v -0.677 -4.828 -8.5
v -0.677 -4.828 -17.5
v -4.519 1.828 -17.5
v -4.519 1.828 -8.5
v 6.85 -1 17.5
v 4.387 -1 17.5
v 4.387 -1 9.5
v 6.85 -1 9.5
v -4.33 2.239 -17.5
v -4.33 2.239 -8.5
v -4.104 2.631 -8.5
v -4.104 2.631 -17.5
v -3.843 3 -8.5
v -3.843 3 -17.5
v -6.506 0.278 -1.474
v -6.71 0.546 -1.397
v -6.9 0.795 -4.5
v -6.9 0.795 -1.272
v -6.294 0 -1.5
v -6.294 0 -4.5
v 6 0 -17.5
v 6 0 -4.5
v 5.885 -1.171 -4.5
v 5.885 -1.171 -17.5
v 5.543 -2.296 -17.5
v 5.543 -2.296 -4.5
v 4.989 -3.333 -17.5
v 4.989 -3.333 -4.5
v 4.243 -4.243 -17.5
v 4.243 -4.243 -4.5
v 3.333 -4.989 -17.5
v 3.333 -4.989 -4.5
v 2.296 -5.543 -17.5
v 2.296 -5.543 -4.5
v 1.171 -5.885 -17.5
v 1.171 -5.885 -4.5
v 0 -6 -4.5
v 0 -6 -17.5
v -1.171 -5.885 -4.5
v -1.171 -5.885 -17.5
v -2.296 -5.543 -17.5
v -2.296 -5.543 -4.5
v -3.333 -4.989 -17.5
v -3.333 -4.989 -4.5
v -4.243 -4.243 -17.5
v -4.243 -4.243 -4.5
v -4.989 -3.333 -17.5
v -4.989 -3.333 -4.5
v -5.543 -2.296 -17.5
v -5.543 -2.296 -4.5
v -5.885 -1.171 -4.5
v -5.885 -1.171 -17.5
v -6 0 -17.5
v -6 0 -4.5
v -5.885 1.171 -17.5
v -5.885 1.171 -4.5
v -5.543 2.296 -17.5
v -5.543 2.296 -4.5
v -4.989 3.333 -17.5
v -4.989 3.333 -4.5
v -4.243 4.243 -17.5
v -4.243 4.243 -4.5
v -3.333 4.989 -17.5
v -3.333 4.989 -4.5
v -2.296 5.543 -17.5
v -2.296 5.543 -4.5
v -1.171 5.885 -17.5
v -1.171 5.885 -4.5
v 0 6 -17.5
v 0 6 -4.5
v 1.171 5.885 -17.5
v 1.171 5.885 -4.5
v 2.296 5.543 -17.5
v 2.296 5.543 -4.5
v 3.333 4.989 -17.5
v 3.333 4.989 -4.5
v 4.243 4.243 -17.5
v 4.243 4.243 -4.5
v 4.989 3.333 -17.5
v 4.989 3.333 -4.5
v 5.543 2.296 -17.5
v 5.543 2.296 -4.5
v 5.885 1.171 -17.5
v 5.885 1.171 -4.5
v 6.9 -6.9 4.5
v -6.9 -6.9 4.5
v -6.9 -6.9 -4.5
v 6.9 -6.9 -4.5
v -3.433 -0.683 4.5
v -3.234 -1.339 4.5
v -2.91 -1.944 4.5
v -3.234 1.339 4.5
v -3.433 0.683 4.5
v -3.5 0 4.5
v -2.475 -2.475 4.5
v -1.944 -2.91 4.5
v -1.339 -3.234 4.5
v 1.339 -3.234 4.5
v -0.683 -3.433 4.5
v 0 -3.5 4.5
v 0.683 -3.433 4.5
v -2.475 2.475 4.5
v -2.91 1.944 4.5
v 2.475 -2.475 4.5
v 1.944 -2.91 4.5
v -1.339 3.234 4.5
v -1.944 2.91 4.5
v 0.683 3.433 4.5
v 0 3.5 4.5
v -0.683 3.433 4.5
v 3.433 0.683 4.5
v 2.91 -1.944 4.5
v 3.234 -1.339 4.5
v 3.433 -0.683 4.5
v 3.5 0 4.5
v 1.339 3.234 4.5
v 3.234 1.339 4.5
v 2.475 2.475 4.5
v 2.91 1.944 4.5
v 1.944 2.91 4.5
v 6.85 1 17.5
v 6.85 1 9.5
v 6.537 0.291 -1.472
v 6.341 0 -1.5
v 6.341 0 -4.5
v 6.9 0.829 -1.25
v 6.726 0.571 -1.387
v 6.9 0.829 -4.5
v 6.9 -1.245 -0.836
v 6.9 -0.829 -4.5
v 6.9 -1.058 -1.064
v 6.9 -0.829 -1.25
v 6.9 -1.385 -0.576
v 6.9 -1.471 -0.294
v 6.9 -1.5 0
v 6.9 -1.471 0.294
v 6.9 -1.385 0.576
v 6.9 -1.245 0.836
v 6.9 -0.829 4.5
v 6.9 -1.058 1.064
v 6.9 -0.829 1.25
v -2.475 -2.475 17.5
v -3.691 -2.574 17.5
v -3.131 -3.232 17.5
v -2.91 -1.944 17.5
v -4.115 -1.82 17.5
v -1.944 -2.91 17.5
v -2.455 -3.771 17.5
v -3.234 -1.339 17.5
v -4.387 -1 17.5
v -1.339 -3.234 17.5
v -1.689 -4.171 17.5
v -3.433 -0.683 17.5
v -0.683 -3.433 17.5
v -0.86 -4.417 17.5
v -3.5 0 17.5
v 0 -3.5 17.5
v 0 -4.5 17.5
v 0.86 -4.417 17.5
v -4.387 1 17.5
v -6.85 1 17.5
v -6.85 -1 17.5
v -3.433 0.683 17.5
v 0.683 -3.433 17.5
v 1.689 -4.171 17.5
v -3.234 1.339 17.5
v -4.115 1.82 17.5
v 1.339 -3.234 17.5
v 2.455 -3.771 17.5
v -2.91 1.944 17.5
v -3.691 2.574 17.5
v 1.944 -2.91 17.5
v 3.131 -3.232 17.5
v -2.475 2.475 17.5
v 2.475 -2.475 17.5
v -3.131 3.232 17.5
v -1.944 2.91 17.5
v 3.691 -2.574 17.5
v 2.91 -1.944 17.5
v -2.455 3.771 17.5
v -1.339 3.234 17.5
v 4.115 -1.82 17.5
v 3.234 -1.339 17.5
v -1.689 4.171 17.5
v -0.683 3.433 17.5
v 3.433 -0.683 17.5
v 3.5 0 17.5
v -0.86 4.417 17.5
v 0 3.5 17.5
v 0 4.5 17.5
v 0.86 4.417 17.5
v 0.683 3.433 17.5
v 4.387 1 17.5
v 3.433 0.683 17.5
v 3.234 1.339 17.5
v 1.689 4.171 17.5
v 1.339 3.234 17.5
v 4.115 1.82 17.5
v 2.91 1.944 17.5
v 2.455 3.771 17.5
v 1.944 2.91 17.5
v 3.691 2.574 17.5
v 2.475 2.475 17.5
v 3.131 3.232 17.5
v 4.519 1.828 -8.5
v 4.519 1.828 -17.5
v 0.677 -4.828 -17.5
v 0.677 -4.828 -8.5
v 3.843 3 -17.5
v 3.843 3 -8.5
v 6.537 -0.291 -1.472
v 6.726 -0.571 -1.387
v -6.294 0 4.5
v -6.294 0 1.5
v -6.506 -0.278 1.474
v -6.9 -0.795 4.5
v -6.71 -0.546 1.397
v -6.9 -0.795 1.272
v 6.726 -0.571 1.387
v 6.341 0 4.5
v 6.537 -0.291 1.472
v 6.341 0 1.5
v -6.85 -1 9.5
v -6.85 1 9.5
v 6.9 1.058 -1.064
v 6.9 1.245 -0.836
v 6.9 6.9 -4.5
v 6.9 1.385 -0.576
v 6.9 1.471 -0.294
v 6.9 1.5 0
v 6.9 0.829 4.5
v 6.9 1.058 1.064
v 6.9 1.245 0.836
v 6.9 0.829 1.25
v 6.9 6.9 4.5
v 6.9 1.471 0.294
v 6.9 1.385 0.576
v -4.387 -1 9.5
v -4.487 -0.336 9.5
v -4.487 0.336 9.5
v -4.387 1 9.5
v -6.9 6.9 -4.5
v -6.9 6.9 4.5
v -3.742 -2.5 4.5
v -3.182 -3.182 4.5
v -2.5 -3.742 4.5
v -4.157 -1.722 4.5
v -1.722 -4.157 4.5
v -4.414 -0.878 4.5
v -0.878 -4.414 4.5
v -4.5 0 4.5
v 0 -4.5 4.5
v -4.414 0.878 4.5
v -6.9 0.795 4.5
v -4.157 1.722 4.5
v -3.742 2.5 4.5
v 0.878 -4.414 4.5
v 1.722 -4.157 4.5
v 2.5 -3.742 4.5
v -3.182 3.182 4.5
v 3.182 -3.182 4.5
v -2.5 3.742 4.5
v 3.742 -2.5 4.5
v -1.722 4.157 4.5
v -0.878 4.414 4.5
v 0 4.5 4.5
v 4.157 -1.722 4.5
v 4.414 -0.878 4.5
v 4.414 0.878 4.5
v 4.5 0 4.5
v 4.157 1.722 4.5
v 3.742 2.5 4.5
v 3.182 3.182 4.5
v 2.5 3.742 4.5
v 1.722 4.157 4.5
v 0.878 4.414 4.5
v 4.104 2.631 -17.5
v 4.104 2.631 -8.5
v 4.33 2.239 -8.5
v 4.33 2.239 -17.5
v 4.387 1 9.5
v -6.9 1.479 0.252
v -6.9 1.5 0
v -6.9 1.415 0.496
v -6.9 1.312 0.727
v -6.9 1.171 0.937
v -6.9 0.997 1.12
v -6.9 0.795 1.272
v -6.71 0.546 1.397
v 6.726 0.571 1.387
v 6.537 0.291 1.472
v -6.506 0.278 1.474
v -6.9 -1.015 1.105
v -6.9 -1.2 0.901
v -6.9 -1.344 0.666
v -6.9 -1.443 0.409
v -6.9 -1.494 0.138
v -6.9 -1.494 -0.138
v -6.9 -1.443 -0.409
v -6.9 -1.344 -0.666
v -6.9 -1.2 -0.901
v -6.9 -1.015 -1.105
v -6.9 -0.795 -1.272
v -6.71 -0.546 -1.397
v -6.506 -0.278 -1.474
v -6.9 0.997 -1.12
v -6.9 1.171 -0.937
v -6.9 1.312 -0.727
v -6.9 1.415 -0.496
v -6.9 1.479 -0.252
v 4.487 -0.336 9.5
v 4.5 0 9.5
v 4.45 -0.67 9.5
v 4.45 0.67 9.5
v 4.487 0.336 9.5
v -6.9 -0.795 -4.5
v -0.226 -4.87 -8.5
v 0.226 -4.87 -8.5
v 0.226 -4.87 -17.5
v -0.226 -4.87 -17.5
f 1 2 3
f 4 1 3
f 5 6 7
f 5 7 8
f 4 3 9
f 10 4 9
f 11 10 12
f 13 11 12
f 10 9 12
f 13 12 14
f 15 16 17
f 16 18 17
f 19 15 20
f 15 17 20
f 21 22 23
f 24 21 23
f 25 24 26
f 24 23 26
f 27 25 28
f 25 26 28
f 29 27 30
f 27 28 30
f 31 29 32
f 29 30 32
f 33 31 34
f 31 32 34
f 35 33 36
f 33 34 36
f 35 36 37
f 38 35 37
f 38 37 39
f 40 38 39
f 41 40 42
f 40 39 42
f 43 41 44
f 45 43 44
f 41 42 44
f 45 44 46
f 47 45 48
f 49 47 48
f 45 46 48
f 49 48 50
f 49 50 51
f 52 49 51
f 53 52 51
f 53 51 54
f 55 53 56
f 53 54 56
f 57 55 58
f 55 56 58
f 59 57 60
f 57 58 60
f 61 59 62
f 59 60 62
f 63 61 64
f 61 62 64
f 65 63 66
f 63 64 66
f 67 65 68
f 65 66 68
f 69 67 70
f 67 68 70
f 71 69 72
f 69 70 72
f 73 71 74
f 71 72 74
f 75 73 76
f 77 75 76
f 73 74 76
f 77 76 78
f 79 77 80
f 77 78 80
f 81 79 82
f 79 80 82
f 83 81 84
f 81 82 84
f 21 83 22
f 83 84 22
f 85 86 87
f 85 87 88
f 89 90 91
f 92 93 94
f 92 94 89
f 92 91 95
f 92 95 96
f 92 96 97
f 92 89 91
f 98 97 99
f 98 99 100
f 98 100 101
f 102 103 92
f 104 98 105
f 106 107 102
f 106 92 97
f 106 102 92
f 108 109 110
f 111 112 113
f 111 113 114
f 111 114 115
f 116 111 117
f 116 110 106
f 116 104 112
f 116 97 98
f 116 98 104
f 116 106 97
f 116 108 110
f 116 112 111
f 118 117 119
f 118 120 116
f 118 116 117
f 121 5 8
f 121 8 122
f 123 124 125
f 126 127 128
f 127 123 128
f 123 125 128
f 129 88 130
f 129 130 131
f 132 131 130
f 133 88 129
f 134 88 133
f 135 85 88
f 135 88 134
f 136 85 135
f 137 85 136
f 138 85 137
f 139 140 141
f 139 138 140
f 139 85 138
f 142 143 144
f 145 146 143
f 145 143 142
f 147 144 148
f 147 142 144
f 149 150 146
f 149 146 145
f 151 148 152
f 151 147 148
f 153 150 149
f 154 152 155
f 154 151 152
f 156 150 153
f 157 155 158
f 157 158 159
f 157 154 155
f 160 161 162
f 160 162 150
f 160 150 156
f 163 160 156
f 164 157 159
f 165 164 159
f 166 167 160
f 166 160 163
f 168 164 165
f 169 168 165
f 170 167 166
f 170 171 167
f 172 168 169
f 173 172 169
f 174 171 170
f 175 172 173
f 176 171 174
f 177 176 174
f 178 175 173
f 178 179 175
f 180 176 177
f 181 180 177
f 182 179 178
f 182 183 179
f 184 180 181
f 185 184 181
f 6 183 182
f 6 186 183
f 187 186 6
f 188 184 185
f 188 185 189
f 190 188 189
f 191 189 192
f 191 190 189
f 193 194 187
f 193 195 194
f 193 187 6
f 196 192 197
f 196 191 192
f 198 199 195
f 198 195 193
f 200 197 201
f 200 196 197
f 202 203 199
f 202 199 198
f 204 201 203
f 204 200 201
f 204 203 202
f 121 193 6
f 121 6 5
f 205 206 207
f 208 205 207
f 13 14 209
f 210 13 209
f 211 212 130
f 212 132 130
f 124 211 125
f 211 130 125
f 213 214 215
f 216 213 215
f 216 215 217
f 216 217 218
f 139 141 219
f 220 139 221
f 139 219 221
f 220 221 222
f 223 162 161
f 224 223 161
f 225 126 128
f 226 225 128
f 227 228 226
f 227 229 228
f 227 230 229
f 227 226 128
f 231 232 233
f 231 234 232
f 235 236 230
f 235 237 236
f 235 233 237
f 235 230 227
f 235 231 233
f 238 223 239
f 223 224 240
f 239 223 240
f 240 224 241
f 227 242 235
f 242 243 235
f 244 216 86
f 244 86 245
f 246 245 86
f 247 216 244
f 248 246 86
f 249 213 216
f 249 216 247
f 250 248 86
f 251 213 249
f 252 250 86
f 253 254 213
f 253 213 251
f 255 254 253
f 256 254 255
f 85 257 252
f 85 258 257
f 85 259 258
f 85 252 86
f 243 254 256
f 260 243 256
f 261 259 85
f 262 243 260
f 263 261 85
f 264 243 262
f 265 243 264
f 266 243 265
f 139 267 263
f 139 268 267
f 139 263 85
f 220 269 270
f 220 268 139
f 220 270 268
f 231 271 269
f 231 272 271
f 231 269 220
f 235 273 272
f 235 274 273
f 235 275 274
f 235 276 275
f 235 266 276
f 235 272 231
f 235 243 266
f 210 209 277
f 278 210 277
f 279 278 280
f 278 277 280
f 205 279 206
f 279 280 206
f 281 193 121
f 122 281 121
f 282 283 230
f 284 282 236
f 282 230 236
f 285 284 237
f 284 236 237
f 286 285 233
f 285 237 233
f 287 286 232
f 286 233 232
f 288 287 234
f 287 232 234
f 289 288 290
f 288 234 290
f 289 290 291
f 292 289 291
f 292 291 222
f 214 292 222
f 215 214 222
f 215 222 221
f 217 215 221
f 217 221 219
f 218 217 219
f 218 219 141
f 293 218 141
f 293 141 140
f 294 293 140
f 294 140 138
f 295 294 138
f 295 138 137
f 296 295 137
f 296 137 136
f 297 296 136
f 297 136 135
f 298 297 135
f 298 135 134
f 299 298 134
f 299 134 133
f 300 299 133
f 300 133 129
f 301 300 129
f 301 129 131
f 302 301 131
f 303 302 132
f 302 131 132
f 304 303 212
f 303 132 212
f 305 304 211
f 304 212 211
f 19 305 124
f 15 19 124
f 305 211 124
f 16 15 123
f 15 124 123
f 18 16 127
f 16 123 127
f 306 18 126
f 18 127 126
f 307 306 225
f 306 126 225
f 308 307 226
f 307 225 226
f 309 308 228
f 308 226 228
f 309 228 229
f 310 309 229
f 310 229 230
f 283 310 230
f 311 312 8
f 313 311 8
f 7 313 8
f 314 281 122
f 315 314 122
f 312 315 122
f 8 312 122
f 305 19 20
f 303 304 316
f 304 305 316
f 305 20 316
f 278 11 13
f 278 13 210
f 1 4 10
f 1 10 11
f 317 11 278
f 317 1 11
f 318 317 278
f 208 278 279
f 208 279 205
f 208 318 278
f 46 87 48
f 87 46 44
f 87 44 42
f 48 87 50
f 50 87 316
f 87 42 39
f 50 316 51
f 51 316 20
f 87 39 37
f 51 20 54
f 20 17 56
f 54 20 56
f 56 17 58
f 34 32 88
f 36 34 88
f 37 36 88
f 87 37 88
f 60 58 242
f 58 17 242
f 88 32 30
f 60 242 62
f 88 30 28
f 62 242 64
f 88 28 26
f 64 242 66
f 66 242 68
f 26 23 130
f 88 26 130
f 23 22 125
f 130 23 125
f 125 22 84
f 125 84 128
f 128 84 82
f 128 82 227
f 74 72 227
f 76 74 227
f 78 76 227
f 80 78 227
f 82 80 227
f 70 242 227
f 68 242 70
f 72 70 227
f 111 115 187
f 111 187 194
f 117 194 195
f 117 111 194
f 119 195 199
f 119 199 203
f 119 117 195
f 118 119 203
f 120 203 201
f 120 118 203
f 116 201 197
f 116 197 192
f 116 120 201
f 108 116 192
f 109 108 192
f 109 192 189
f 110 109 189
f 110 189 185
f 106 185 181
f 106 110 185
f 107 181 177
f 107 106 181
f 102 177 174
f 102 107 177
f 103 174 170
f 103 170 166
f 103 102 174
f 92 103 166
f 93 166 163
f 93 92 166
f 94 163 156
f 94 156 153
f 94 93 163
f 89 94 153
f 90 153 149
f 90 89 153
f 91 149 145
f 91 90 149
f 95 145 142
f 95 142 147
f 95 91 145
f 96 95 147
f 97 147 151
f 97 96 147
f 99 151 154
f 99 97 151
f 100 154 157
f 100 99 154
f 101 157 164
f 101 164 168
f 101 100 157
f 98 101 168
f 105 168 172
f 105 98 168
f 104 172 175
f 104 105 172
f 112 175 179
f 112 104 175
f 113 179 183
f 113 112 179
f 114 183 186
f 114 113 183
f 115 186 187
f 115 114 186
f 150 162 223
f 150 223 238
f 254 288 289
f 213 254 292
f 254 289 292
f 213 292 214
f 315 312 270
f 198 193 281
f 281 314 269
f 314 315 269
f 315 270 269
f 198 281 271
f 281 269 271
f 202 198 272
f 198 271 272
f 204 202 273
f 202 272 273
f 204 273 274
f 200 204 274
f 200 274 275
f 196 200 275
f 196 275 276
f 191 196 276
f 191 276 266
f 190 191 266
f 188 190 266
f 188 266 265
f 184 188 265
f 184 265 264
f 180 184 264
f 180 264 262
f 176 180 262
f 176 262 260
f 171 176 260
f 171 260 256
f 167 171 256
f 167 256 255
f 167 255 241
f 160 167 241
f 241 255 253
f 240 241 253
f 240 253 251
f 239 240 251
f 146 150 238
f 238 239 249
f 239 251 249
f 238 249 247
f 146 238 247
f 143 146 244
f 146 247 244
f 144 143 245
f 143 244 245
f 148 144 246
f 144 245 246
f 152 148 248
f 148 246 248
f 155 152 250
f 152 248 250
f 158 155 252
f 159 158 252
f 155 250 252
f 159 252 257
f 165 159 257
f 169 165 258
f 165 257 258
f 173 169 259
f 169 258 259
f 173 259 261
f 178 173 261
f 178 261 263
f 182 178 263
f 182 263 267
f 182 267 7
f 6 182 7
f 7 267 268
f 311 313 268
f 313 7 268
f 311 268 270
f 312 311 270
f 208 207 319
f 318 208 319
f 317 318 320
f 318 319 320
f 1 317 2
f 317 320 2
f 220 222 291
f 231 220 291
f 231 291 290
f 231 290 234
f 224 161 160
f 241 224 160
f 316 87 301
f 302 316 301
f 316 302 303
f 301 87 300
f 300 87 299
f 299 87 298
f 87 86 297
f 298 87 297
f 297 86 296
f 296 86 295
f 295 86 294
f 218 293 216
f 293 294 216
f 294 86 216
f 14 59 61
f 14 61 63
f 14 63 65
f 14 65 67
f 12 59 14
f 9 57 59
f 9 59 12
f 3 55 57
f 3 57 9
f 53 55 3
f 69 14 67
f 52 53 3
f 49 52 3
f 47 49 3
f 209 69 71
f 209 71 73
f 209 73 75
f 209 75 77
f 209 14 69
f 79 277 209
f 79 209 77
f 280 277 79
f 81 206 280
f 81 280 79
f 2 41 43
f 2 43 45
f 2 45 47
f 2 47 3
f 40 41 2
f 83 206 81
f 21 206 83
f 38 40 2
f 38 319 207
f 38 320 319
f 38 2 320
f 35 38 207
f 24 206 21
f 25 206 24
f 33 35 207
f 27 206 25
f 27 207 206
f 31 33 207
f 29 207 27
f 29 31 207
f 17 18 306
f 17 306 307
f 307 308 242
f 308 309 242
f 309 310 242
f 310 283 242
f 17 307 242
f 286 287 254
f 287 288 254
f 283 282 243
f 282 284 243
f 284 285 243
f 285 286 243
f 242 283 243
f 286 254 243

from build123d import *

# Parameters (mm, degrees)
F0_W      = 13.8
F0_H      = 13.8
F1_DEPTH  = 4.5
F2_R      = 4.5
F2_R_2    = 3.5
F3_DEPTH  = 13
F4_R      = 6
F5_DEPTH  = 13
F6_R      = 1.5
F7_DEPTH  = 13.801
F9_DEPTH  = 22.001
F10_W     = 3.2331479252
F10_H     = 2
F11_DEPTH = 8
F13_DEPTH = 9


with BuildPart() as f1:
    # F0 (on Top) → F1 (new body, symmetric)
    with BuildSketch(Plane.XY):
        Rectangle(F0_W, F0_H)
    extrude(amount=F1_DEPTH, both=True)

    # F2 (on face) → F3 (join)
    with BuildSketch(Plane.XY.offset(4.5)):
        Circle(F2_R)
        Circle(F2_R_2, mode=Mode.SUBTRACT)
    extrude(amount=F3_DEPTH)

    # F4 (on face) → F5 (join)
    with BuildSketch(Plane(origin=(0, 0, -4.5), x_dir=(1, 0, 0), z_dir=(0, 0, -1))):
        Circle(F4_R)
    extrude(amount=F5_DEPTH)

    # F6 (on face) → F7 (cut, through all)
    with BuildSketch(Plane.YZ.offset(6.9)):
        Circle(F6_R)
    extrude(amount=-F7_DEPTH, mode=Mode.SUBTRACT)

    # F8 (on face) → F9 (cut, through all)
    with BuildSketch(Plane(origin=(0, 0, -4.5), x_dir=(1, 0, 0), z_dir=(0, 0, -1))):
        Polygon((6.9, 0.8288529099), (6.3405334204, 0), (6.9, -0.8288529099), align=None)
        Polygon((-6.9, -0.7952927344), (-6.2937744095, 0), (-6.9, 0.7952927344), align=None)
    extrude(amount=-F9_DEPTH, mode=Mode.SUBTRACT)

    # F10 (on face) → F11 (join)
    with BuildSketch(Plane.XY.offset(17.5)):
        with Locations((-5.2334260374, 0)):
            Rectangle(F10_W, F10_H)
        with Locations((5.2334260374, 0)):
            Rectangle(F10_W, F10_H)
    extrude(amount=-F11_DEPTH)

    # F12 (on face) → F13 (cut)
    with BuildSketch(Plane(origin=(0, 0, -17.5), x_dir=(1, 0, 0), z_dir=(0, 0, -1))):
        with BuildLine():
            Line((4.51937948, -1.827794878), (0.6767729427, 4.827794878))
            ThreePointArc((0.6767729427, 4.827794878), (0, 4.875), (-0.6767729427, 4.827794878))
            Line((-0.6767729427, 4.827794878), (-4.51937948, -1.827794878))
            ThreePointArc((-4.51937948, -1.827794878), (-4.2218738434, -2.4375), (-3.8426065372, -3))
            Line((-3.8426065372, -3), (3.8426065372, -3))
            ThreePointArc((3.8426065372, -3), (4.2218738434, -2.4375), (4.51937948, -1.827794878))
        make_face()
    extrude(amount=-F13_DEPTH, mode=Mode.SUBTRACT)


solid = f1.part
